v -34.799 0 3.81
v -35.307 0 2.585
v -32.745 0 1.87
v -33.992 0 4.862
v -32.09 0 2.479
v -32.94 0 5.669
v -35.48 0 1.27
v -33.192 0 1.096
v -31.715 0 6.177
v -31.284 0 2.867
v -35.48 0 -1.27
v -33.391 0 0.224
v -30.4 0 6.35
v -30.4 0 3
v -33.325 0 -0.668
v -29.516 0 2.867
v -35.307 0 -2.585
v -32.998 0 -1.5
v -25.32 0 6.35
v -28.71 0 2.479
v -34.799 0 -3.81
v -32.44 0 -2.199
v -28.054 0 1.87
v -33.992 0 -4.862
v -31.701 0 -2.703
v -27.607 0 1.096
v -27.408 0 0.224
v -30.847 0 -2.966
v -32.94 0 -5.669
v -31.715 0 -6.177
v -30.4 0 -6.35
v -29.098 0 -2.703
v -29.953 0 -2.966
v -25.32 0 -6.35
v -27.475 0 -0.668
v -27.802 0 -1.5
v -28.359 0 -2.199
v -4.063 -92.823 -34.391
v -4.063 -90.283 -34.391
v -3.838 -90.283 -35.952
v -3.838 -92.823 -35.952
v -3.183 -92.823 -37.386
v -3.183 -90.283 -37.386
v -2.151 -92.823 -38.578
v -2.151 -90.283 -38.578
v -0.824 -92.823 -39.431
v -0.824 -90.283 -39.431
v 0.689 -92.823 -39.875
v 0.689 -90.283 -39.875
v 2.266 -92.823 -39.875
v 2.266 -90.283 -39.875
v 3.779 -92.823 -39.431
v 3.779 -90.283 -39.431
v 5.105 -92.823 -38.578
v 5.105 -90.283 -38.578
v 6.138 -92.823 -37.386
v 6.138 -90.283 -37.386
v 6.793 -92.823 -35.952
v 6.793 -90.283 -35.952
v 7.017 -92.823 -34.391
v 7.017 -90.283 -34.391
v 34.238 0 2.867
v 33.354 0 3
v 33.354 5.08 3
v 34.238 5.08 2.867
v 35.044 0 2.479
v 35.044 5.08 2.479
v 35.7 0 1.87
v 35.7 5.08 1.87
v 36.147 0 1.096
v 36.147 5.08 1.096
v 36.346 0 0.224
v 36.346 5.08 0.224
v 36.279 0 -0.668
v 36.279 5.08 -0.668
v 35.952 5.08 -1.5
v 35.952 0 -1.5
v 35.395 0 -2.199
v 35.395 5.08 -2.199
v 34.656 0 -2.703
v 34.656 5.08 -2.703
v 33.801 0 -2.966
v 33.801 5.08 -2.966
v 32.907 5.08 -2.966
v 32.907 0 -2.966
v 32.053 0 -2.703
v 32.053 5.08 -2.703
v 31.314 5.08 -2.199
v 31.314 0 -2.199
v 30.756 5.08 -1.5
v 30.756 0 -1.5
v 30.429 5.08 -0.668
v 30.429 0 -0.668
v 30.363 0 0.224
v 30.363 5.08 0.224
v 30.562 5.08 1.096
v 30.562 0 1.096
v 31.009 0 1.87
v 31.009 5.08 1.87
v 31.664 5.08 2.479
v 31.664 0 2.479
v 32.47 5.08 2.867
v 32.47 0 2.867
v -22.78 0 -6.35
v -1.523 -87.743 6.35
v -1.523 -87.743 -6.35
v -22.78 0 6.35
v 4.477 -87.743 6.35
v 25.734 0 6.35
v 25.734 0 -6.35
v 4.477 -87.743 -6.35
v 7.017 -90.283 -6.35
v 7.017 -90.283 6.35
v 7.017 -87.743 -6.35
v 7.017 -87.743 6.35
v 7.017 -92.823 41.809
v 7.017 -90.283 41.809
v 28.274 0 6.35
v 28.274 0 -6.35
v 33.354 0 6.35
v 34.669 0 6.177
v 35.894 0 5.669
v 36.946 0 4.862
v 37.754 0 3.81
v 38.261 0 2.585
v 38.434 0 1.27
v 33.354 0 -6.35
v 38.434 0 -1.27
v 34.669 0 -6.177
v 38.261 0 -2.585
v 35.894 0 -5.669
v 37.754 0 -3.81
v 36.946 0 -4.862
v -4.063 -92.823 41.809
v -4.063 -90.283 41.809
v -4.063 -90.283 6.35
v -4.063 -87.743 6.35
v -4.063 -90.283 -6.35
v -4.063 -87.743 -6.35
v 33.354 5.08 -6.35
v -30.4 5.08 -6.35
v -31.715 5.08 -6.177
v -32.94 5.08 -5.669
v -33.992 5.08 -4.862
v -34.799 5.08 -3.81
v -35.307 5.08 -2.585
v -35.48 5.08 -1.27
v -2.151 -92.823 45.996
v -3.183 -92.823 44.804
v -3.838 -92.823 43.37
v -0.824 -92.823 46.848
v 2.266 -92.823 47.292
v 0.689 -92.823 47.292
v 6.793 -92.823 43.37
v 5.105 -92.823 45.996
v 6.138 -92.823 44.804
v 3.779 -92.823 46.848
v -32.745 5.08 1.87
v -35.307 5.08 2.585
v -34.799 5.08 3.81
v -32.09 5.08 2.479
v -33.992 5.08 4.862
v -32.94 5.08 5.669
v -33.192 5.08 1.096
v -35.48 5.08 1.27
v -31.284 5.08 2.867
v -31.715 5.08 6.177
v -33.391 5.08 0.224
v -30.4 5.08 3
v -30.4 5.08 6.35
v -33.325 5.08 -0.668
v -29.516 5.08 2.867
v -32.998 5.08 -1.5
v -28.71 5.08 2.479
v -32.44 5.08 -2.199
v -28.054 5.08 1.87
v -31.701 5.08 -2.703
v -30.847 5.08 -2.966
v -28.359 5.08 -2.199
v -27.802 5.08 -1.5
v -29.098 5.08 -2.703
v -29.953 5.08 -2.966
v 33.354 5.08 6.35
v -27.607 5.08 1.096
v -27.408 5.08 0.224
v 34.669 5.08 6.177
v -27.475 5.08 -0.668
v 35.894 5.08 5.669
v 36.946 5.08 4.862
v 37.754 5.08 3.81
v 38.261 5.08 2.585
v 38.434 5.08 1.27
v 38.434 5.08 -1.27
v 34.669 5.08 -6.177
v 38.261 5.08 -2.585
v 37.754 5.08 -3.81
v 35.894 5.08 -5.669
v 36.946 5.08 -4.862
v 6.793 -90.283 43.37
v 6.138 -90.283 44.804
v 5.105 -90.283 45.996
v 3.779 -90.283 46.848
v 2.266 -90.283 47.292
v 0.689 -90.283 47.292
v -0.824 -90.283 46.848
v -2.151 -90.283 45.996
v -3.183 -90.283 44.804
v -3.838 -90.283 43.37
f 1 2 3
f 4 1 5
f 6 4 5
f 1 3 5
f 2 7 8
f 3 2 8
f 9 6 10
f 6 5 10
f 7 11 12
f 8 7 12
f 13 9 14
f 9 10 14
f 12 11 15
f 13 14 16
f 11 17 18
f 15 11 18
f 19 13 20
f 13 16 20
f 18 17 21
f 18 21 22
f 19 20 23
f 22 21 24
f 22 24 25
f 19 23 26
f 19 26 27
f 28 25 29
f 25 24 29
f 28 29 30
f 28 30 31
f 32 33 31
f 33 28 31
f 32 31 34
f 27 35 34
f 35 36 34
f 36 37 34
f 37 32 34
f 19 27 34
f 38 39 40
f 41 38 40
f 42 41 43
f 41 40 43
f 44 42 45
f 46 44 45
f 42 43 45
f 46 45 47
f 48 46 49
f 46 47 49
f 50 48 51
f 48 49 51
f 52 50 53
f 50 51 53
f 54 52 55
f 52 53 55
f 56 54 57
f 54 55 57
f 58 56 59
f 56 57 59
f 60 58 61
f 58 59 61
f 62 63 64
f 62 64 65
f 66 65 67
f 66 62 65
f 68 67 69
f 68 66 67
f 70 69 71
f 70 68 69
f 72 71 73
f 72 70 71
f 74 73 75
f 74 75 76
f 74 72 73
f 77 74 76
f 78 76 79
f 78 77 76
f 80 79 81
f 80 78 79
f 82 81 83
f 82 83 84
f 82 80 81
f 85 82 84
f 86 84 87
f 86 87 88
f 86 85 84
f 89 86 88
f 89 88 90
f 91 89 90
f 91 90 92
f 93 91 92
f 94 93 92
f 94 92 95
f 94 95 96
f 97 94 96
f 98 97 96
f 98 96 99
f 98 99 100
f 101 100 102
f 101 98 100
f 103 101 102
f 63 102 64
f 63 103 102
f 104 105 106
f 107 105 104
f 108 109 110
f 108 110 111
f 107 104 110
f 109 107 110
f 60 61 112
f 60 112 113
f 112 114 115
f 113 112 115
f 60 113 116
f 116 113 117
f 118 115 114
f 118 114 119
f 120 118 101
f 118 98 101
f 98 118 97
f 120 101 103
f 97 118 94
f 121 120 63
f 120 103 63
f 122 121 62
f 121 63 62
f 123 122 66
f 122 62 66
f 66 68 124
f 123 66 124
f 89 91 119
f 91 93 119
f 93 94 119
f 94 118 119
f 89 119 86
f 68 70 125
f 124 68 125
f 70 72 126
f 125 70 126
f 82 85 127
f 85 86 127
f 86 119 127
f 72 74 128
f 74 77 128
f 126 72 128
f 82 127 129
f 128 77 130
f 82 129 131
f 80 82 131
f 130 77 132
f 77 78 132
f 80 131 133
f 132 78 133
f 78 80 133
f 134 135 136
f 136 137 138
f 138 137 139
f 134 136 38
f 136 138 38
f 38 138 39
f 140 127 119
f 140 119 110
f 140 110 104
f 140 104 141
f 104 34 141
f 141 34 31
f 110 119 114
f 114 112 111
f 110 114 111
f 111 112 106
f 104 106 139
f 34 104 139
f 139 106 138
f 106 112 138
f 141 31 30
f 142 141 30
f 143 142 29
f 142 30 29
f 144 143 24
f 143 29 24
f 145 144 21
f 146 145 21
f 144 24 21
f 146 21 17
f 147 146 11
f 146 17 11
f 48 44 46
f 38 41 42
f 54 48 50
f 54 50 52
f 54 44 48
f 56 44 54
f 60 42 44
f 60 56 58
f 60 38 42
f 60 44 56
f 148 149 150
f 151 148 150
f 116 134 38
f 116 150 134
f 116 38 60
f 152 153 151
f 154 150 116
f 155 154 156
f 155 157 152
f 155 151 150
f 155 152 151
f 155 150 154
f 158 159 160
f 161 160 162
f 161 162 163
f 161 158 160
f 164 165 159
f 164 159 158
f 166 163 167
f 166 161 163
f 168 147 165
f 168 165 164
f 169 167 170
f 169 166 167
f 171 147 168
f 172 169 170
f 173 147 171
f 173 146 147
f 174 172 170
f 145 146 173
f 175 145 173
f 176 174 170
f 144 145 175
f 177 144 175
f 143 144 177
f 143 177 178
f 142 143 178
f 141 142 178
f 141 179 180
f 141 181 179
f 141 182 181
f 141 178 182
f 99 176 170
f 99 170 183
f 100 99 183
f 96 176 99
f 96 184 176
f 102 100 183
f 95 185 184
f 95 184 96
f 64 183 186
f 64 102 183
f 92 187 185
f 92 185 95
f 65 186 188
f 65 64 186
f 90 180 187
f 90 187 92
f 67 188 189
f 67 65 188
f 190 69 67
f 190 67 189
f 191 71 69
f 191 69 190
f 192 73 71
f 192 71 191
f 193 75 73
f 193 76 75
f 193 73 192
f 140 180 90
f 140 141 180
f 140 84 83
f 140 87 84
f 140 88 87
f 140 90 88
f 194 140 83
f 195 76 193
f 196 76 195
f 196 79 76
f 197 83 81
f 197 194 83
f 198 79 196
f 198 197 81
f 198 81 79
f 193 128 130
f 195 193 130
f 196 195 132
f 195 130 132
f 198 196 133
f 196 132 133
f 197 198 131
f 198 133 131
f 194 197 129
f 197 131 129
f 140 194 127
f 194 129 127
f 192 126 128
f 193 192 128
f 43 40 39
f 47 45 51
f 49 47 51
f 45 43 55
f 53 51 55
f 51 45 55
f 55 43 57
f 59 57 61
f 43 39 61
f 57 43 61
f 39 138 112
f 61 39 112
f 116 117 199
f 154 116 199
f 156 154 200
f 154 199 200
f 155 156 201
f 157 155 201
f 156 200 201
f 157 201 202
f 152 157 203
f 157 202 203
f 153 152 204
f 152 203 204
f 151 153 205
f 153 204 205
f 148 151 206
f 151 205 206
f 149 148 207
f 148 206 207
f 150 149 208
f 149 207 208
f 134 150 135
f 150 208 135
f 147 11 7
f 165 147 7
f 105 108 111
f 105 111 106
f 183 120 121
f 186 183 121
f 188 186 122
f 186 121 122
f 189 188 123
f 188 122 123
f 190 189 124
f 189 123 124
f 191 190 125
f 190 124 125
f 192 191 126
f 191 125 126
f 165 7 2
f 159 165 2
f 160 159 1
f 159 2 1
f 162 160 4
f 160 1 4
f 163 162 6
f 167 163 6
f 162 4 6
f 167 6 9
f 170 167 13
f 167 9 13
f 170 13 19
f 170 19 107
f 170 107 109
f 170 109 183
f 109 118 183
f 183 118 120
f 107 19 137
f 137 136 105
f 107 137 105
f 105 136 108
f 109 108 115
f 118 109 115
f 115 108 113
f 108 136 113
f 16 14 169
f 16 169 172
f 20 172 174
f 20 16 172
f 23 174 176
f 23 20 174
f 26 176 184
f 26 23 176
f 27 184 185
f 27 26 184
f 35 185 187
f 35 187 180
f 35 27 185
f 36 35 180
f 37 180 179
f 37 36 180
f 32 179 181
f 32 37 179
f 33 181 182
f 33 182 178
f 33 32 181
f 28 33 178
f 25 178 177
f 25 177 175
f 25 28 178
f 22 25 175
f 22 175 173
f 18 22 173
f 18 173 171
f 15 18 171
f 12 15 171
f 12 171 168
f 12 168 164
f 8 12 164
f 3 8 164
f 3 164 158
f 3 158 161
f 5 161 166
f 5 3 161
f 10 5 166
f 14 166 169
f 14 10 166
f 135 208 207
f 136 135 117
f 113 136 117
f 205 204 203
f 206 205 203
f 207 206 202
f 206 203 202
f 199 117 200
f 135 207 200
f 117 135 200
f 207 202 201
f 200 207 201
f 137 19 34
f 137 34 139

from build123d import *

# Parameters (mm, degrees)
SKETCH1_R           = 3
BOSS_EXTRUDE1_DEPTH = 5.08
BOSS_EXTRUDE2_DEPTH = 12.7
BOSS_EXTRUDE3_DEPTH = 2.54


with BuildPart() as part:
    # Sketch1 → Boss-Extrude1 (new body)
    with BuildSketch(Plane(origin=(0, 0, 0), x_dir=(1, 0, 0), z_dir=(0, 1, 0))):
        with BuildLine():
            Line((-24.747623202, 6.35), (-30.399794039, 6.35))
            ThreePointArc((-30.399794039, 6.35), (-33.991896487, 4.862102448), (-35.479794039, 1.27))
            Line((-35.479794039, 1.27), (-35.479794039, -1.27))
            ThreePointArc((-35.479794039, -1.27), (-33.991896487, -4.862102448), (-30.399794039, -6.35))
            Line((-30.399794039, -6.35), (-24.747623202, -6.35))
            Line((-24.747623202, -6.35), (27.702035125, -6.35))
            Line((27.702035125, -6.35), (33.354205961, -6.35))
            ThreePointArc((33.354205961, -6.35), (36.94630841, -4.862102448), (38.434205961, -1.27))
            Line((38.434205961, -1.27), (38.434205961, 1.27))
            ThreePointArc((38.434205961, 1.27), (36.94630841, 4.862102448), (33.354205961, 6.35))
            Line((33.354205961, 6.35), (27.702035125, 6.35))
            Line((27.702035125, 6.35), (-24.747623202, 6.35))
        make_face()
        with Locations(Location((-30.399794039, 0, 0), (0, 0, 270))):
            Circle(SKETCH1_R, mode=Mode.SUBTRACT)
        with Locations(Location((33.354205961, 0, 0), (0, 0, 270))):
            Circle(SKETCH1_R, mode=Mode.SUBTRACT)
    extrude(amount=BOSS_EXTRUDE1_DEPTH)

    # Sketch3 → Boss-Extrude2 (add)
    with BuildSketch(Plane.XY.offset(6.35)):
        Polygon((-25.319794039, 0), (-4.062794039, -87.74317324), (-4.062794039, -90.28317324), (7.017205961, -90.28317324), (7.017205961, -87.74317324), (28.274205961, 0), (25.734205961, 0), (4.477205961, -87.74317324), (-1.522794039, -87.74317324), (-22.779794039, 0), align=None)
    extrude(amount=-BOSS_EXTRUDE2_DEPTH)

    # Sketch4 → Boss-Extrude3 (add)
    with BuildSketch(Plane.XZ.offset(90.28317324)):
        with BuildLine():
            Line((-4.062794039, 41.80872522), (-4.062794039, -34.39127478))
            ThreePointArc((-4.062794039, -34.39127478), (1.477205961, -39.93127478), (7.017205961, -34.39127478))
            Line((7.017205961, -34.39127478), (7.017205961, 41.80872522))
            ThreePointArc((7.017205961, 41.80872522), (1.477205961, 47.34872522), (-4.062794039, 41.80872522))
        make_face()
    extrude(amount=BOSS_EXTRUDE3_DEPTH)


solid = part.part
